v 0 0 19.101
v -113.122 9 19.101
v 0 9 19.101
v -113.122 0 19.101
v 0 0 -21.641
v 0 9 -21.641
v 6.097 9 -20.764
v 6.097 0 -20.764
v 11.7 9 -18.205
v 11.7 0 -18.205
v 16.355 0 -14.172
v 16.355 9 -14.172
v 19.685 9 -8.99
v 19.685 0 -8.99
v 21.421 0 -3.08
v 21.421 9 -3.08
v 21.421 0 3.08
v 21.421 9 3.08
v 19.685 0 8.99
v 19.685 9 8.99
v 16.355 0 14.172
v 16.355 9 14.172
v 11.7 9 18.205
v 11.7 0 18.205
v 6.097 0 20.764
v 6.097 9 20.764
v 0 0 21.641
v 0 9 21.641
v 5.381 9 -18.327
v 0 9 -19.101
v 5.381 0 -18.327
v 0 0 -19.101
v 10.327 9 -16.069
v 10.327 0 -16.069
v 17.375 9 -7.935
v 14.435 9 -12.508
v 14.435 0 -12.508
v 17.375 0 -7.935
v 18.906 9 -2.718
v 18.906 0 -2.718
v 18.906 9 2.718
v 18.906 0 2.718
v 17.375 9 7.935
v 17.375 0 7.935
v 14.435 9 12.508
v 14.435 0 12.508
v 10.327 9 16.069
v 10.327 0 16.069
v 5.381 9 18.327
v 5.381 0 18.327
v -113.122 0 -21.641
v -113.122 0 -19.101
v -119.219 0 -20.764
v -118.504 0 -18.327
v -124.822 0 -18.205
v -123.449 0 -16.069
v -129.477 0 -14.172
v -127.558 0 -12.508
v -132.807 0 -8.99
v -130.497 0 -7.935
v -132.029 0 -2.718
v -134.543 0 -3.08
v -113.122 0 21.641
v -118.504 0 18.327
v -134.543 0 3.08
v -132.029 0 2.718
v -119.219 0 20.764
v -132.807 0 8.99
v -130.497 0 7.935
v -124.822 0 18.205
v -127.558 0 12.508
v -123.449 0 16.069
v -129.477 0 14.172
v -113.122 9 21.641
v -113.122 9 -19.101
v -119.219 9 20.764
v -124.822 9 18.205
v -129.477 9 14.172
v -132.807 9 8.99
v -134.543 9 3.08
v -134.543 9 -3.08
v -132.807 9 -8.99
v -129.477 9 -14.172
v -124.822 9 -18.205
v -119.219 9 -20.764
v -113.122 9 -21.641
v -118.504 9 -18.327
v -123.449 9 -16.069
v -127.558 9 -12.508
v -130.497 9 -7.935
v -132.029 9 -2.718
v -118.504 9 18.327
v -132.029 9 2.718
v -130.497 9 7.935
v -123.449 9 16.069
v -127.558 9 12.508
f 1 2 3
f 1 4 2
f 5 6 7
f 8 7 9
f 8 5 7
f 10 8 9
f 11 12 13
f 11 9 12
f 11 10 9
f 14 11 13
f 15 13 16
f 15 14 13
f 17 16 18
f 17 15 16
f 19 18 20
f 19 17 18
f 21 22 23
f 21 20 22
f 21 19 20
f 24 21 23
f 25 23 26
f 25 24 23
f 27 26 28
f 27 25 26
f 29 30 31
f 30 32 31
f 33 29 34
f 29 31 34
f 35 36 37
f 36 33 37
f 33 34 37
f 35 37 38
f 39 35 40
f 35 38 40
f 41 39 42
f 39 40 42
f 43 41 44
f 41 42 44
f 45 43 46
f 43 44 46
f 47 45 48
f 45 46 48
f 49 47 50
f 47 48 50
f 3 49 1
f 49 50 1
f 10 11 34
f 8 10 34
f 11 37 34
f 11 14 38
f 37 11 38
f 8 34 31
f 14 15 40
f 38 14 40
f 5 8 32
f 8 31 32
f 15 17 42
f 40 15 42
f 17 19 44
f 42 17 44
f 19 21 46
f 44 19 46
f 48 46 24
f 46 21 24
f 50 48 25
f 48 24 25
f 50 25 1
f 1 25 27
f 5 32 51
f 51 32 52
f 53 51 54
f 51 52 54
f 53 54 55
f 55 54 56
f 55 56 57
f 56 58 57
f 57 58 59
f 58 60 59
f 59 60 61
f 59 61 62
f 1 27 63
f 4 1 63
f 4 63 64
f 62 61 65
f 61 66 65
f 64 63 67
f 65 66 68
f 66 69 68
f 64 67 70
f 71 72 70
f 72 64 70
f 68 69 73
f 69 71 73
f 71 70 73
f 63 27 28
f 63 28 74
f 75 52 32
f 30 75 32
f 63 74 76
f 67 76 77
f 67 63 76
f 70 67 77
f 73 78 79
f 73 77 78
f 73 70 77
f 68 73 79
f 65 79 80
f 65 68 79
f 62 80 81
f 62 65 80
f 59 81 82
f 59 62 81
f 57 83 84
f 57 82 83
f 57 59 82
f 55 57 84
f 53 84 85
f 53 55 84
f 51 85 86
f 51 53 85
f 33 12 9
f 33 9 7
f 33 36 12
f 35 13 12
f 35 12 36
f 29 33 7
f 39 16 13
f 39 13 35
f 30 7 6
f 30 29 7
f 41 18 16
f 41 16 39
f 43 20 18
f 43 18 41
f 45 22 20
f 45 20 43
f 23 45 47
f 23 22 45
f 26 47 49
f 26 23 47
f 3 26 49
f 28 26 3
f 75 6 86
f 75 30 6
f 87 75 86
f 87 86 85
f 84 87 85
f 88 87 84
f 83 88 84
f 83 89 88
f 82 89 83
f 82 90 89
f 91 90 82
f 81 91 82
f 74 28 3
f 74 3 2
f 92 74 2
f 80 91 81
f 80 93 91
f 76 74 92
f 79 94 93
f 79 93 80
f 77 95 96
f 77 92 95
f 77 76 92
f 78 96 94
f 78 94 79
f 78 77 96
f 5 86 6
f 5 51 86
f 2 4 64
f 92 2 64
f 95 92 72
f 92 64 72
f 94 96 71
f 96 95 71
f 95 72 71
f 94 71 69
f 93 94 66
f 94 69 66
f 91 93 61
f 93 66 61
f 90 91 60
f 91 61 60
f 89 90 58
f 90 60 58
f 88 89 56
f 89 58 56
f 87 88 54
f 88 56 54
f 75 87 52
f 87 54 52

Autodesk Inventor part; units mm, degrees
ref_plane "YZ Plane" through (0, 0, 0) normal (1, 0, 0) x (0, 1, 0)
ref_plane "XZ Plane" through (0, 0, 0) normal (0, 1, 0) x (-1, 0, 0)
ref_plane "XY Plane" through (0, 0, 0) normal (0, 0, 1) x (1, 0, 0)
sketch "Sketch1" plane through (0, 0, 0) normal (0, 1, 0) x (-1, 0, 0)
  circle A0 centre (0, 0) radius 19.1008 construction
  line L0 (0, 0) -> (113.1223, 0) construction
  circle A1 centre (113.1223, 0) radius 19.1008 construction
  line L1 (113.1223, 19.1008) -> (0, 19.1008)
  line L2 (113.1223, -19.1008) -> (0, -19.1008)
  arc A2 (113.1223, -19.1008) -> (113.1223, 19.1008) centre (113.1223, 0) ccw
  arc A3 (0, 19.1008) -> (0, -19.1008) centre (0, 0) ccw
  line L3 (0, 21.6408) -> (113.1223, 21.6408)
  arc A4 (113.1223, -21.6408) -> (113.1223, 21.6408) centre (113.1223, 0) ccw
  line L4 (113.1223, -21.6408) -> (0, -21.6408)
  arc A5 (0, 21.6408) -> (0, -21.6408) centre (0, 0) ccw
  dimension "d0" = 38.2016
  dimension "d1" = 38.2016
  dimension "d2" = 113.1223
  dimension "d3" = 2.54
extrude "Extrusion1" add sketch "Sketch1" along normal blind 9
properties part number "SHOT_1_014_Belt3" material "Rubber, Silicone"
